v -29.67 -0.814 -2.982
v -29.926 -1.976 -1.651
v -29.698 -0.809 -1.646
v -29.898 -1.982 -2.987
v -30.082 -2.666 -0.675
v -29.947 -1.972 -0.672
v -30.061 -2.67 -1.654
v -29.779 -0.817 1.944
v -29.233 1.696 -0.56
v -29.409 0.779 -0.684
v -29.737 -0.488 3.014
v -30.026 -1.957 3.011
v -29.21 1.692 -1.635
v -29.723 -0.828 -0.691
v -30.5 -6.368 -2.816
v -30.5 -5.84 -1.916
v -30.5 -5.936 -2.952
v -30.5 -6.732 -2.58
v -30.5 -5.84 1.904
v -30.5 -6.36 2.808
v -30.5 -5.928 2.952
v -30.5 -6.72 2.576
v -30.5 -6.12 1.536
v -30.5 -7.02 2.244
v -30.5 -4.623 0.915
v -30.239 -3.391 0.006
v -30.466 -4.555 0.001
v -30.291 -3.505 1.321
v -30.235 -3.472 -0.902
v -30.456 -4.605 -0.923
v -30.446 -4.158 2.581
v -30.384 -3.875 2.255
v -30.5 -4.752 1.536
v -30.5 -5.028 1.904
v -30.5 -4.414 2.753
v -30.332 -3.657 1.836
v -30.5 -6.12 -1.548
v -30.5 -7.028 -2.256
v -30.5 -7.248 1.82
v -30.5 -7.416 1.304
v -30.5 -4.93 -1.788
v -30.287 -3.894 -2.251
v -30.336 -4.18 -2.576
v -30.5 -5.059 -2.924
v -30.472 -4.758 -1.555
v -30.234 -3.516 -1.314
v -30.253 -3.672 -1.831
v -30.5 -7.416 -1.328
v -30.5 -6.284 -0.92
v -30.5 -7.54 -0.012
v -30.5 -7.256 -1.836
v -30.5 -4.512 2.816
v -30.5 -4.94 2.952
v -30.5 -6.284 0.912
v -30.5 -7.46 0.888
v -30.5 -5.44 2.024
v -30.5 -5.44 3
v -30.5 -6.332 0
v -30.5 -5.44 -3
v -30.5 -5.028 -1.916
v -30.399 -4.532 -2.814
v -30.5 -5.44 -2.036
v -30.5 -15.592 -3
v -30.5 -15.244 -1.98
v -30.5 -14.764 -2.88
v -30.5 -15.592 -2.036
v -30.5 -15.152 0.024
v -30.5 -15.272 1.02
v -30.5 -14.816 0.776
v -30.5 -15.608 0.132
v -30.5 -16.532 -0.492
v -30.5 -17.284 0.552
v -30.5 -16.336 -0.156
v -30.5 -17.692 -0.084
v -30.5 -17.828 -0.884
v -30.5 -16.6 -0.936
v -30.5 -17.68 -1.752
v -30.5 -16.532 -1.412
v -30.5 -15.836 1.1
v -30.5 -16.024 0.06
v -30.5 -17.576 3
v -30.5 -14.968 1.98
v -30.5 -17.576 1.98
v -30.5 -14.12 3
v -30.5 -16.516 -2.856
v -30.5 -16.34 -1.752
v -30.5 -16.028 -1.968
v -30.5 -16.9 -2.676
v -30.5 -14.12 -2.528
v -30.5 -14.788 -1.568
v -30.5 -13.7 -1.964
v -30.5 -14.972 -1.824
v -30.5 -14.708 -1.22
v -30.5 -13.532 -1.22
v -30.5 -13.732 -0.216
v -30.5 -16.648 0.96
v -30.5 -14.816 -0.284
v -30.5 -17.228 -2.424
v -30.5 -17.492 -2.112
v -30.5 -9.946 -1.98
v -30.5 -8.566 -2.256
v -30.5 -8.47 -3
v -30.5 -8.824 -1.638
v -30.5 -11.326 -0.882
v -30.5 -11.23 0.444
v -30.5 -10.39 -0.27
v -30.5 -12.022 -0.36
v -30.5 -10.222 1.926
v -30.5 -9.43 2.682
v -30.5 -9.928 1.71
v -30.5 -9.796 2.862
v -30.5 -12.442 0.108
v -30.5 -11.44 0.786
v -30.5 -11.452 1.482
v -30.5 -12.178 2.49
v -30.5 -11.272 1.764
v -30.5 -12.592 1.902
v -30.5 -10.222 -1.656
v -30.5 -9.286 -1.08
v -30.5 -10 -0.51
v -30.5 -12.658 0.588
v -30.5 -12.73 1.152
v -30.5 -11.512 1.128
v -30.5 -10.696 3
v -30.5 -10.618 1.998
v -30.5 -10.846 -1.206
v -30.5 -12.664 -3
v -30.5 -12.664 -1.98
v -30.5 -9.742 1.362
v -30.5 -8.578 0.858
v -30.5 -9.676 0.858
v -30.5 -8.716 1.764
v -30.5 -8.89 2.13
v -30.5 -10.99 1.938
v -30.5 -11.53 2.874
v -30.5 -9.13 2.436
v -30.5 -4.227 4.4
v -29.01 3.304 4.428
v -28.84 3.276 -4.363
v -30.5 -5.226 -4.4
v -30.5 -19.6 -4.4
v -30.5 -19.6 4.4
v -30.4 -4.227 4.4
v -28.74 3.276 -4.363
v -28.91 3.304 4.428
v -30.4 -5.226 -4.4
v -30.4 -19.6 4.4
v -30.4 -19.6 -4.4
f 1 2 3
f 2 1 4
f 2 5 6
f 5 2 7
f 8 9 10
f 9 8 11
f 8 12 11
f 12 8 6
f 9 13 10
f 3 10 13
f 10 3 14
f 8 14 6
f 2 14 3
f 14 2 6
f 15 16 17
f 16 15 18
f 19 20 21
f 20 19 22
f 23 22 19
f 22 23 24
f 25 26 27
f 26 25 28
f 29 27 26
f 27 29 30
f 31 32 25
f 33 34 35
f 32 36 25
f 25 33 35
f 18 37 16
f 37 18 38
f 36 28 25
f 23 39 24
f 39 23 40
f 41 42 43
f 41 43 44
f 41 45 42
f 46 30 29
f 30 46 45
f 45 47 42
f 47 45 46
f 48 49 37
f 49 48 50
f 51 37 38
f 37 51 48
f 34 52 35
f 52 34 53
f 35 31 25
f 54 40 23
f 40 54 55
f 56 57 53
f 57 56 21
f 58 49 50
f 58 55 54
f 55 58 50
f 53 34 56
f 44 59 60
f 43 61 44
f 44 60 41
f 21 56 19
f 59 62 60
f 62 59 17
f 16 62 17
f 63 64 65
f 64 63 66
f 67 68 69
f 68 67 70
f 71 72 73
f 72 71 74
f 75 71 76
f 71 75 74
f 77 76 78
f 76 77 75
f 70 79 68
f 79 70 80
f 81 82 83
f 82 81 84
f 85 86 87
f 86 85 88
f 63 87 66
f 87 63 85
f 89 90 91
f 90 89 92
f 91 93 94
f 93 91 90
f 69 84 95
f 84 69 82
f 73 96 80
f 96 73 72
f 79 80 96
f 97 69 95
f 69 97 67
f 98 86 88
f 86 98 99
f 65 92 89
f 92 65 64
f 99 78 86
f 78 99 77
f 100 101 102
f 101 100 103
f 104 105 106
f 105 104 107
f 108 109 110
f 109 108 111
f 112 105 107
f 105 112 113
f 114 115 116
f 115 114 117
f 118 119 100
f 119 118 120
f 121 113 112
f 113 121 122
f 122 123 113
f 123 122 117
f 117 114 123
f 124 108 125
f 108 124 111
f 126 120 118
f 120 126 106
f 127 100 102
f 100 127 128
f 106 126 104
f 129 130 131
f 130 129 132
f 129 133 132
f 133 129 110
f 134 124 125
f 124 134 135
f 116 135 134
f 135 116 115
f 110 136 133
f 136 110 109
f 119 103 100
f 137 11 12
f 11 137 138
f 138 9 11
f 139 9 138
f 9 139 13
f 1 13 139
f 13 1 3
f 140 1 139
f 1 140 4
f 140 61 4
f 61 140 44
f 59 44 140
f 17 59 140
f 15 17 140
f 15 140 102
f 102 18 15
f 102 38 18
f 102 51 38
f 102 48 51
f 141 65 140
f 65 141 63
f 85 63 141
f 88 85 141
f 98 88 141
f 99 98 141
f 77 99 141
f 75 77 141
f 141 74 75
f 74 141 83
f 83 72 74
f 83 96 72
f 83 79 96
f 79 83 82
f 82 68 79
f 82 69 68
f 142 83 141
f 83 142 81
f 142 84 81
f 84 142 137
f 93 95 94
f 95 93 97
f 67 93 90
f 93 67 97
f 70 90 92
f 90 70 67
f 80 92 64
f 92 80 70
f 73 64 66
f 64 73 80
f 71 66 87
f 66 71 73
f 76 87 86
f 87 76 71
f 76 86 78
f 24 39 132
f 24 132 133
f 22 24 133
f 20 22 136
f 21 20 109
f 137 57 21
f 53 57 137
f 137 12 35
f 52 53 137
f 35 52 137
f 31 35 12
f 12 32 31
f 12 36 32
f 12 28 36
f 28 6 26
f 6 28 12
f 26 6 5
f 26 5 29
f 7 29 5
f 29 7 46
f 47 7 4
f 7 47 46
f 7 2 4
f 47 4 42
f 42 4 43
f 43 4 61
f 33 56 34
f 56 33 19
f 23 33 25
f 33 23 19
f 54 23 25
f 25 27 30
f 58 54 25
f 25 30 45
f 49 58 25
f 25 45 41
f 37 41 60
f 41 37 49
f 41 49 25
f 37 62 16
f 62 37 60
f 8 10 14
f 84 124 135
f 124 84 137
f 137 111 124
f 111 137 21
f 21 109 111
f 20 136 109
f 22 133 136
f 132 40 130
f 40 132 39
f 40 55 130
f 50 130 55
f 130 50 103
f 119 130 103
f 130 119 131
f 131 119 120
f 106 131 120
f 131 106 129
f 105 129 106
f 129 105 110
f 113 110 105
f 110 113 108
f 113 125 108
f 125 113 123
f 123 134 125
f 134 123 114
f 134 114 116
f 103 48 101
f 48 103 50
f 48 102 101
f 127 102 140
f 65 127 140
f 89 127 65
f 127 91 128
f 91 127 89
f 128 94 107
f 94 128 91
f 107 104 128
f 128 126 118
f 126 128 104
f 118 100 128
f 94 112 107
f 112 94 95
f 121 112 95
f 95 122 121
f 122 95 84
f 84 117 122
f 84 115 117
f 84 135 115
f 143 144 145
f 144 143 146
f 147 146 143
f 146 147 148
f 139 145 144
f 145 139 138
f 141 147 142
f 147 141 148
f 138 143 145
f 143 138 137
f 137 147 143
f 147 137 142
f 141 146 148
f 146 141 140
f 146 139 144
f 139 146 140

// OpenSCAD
use <../lib.scad>
function ldraw_lib__194305fc02() = [
// 0 Sticker  1.1 x  2.9 with White "4025" on Transparent Background (Formed for Boat Stern Right Side)
// 0 Name: 194305fc02.dat
// 0 Author: Takeshi Takahashi [RainbowDolphin]
// 0 !LDRAW_ORG Part UPDATE 2022-06
// 0 !LICENSE Licensed under CC BY 2.0 and CC BY 4.0 : see CAreadme.txt
// 
// 0 BFC CERTIFY CCW
  [0,"BFC","CERTIFY"],
  [0,"BFC","CCW"],
// 
// 0 !KEYWORDS Bricklink 4025stk01, Brickowl 866936, Fire boat, Rebrickable 194305
// 0 !KEYWORDS Set 4025
// 
// 0 !HISTORY 2022-12-20 [PTadmin] Official Update 2022-06
// 
// 
// 0 BFC NOCLIP
  [0,"BFC","NOCLIP"],
// 4 15 -74.1739 7.454 -2.0356 -74.7438 7.4666 -4.9542 -74.8151 4.1282 -4.9403 -74.2453 4.1155 -2.0216
  [4,15,-74.1739,7.454,-2.0356,-74.7438,7.4666,-4.9542,-74.8151,4.1282,-4.9403,-74.2453,4.1155,-2.0216],
// 4 15 -74.8675 1.6793 -4.9301 -74.8151 4.1282 -4.9403 -75.1537 4.1357 -6.6742 -75.206 1.6868 -6.6639
  [4,15,-74.8675,1.6793,-4.9301,-74.8151,4.1282,-4.9403,-75.1537,4.1357,-6.6742,-75.206,1.6868,-6.6639],
// 4 15 -73.5233 1.7095 1.9474 -74.4483 -4.86 -2.042 -74.3434 -7.5361 -1.2192 -73.0821 1.3997 4.2412
  [4,15,-73.5233,1.7095,1.9474,-74.4483,-4.86,-2.042,-74.3434,-7.5361,-1.2192,-73.0821,1.3997,4.2412],
// 4 15 -75.0641 -7.5263 -4.8917 -74.3434 -7.5361 -1.2192 -74.4483 -4.86 -2.042 -74.8675 1.6793 -4.9301
  [4,15,-75.0641,-7.5263,-4.8917,-74.3434,-7.5361,-1.2192,-74.4483,-4.86,-2.042,-74.8675,1.6793,-4.9301],
// 3 15 -73.0821 1.3997 4.2412 -73.0246 4.0885 4.2299 -73.5233 1.7095 1.9474
  [3,15,-73.0821,1.3997,4.2412,-73.0246,4.0885,4.2299,-73.5233,1.7095,1.9474],
// 4 15 -74.3076 1.7269 -2.0694 -73.5233 1.7095 1.9474 -73.0246 4.0885 4.2299 -74.2453 4.1155 -2.0216
  [4,15,-74.3076,1.7269,-2.0694,-73.5233,1.7095,1.9474,-73.0246,4.0885,4.2299,-74.2453,4.1155,-2.0216],
// 3 15 -74.4483 -4.86 -2.042 -74.3076 1.7269 -2.0694 -74.8675 1.6793 -4.9301
  [3,15,-74.4483,-4.86,-2.042,-74.3076,1.7269,-2.0694,-74.8675,1.6793,-4.9301],
// 4 15 -74.2453 4.1155 -2.0216 -74.8151 4.1282 -4.9403 -74.8675 1.6793 -4.9301 -74.3076 1.7269 -2.0694
  [4,15,-74.2453,4.1155,-2.0216,-74.8151,4.1282,-4.9403,-74.8675,1.6793,-4.9301,-74.3076,1.7269,-2.0694],
// 4 15 -76.25 6.45 -16.83 -76.25 4.79 -14.6 -76.25 7.38 -14.84 -76.25 7.04 -15.92
  [4,15,-76.25,6.45,-16.83,-76.25,4.79,-14.6,-76.25,7.38,-14.84,-76.25,7.04,-15.92],
// 4 15 -76.25 -7.38 -14.82 -76.25 -4.76 -14.6 -76.25 -6.44 -16.8 -76.25 -7.02 -15.9
  [4,15,-76.25,-7.38,-14.82,-76.25,-4.76,-14.6,-76.25,-6.44,-16.8,-76.25,-7.02,-15.9],
// 4 15 -76.25 -5.61 -17.55 -76.25 -6.44 -16.8 -76.25 -4.76 -14.6 -76.25 -3.84 -15.3
  [4,15,-76.25,-5.61,-17.55,-76.25,-6.44,-16.8,-76.25,-4.76,-14.6,-76.25,-3.84,-15.3],
// 4 15 -75.7265 -3.3016 -8.7623 -75.598 -.0145 -8.4774 -76.166 -.0019 -11.3864 -76.25 -2.2876 -11.557
  [4,15,-75.7265,-3.3016,-8.7623,-75.598,-.0145,-8.4774,-76.166,-.0019,-11.3864,-76.25,-2.2876,-11.557],
// 4 15 -75.598 -.0145 -8.4774 -75.5871 2.2553 -8.6795 -76.1392 2.3075 -11.5116 -76.166 -.0019 -11.3864
  [4,15,-75.598,-.0145,-8.4774,-75.5871,2.2553,-8.6795,-76.1392,2.3075,-11.5116,-76.166,-.0019,-11.3864],
// 3 15 -76.1156 -6.453 -10.3962 -75.959 -5.6365 -9.6869 -76.25 -2.2876 -11.557
  [3,15,-76.1156,-6.453,-10.3962,-75.959,-5.6365,-9.6869,-76.25,-2.2876,-11.557],
// 3 15 -76.25 -3.84 -11.881 -76.25 -4.76 -12.57 -76.25 -6.8814 -11.0354
  [3,15,-76.25,-3.84,-11.881,-76.25,-4.76,-12.57,-76.25,-6.8814,-11.0354],
// 3 15 -75.959 -5.6365 -9.6869 -75.8293 -4.5893 -9.1422 -76.25 -2.2876 -11.557
  [3,15,-75.959,-5.6365,-9.6869,-75.8293,-4.5893,-9.1422,-76.25,-2.2876,-11.557],
// 3 15 -76.25 -2.2876 -11.557 -76.25 -3.84 -11.881 -76.25 -6.8814 -11.0354
  [3,15,-76.25,-2.2876,-11.557,-76.25,-3.84,-11.881,-76.25,-6.8814,-11.0354],
// 4 15 -76.25 4.79 -14.6 -76.25 6.45 -16.83 -76.25 5.64 -17.57 -76.25 3.87 -15.3
  [4,15,-76.25,4.79,-14.6,-76.25,6.45,-16.83,-76.25,5.64,-17.57,-76.25,3.87,-15.3],
// 3 15 -75.8293 -4.5893 -9.1422 -75.7265 -3.3016 -8.7623 -76.25 -2.2876 -11.557
  [3,15,-75.8293,-4.5893,-9.1422,-75.7265,-3.3016,-8.7623,-76.25,-2.2876,-11.557],
// 4 15 -76.25 -3.26 -18.54 -76.25 -4.55 -18.12 -76.25 -5.61 -17.55 -76.25 -3.84 -15.3
  [4,15,-76.25,-3.26,-18.54,-76.25,-4.55,-18.12,-76.25,-5.61,-17.55,-76.25,-3.84,-15.3],
// 3 15 -76.25 4.469 -12.3242 -75.7183 5.6282 -9.7339 -75.8401 6.4409 -10.4501
  [3,15,-76.25,4.469,-12.3242,-75.7183,5.6282,-9.7339,-75.8401,6.4409,-10.4501],
// 3 15 -76.25 4.469 -12.3242 -75.8401 6.4409 -10.4501 -76.25 7.311 -12.647
  [3,15,-76.25,4.469,-12.3242,-75.8401,6.4409,-10.4501,-76.25,7.311,-12.647],
// 3 15 -76.25 4.469 -12.3242 -76.179 3.8884 -11.8949 -75.7183 5.6282 -9.7339
  [3,15,-76.25,4.469,-12.3242,-76.179,3.8884,-11.8949,-75.7183,5.6282,-9.7339],
// 4 15 -75.5871 2.2553 -8.6795 -75.5858 3.2853 -8.7897 -76.179 3.8884 -11.8949 -76.1392 2.3075 -11.5116
  [4,15,-75.5871,2.2553,-8.6795,-75.5858,3.2853,-8.7897,-76.179,3.8884,-11.8949,-76.1392,2.3075,-11.5116],
// 4 15 -75.5858 3.2853 -8.7897 -75.6335 4.5763 -9.1804 -75.7183 5.6282 -9.7339 -76.179 3.8884 -11.8949
  [4,15,-75.5858,3.2853,-8.7897,-75.6335,4.5763,-9.1804,-75.7183,5.6282,-9.7339,-76.179,3.8884,-11.8949],
// 4 15 -76.25 .03 -18.85 -76.25 2.3 -15.71 -76.25 3.87 -15.3 -76.25 3.32 -18.54
  [4,15,-76.25,.03,-18.85,-76.25,2.3,-15.71,-76.25,3.87,-15.3,-76.25,3.32,-18.54],
// 4 15 -76.25 5.64 -17.57 -76.25 4.59 -18.14 -76.25 3.32 -18.54 -76.25 3.87 -15.3
  [4,15,-76.25,5.64,-17.57,-76.25,4.59,-18.14,-76.25,3.32,-18.54,-76.25,3.87,-15.3],
// 4 15 -76.25 -7.04 -11.28 -76.25 -6.8814 -11.0354 -76.25 -4.76 -12.57 -76.25 -7.38 -12.35
  [4,15,-76.25,-7.04,-11.28,-76.25,-6.8814,-11.0354,-76.25,-4.76,-12.57,-76.25,-7.38,-12.35],
// 3 15 -76.25 -6.8814 -11.0354 -76.1156 -6.453 -10.3962 -76.25 -2.2876 -11.557
  [3,15,-76.25,-6.8814,-11.0354,-76.1156,-6.453,-10.3962,-76.25,-2.2876,-11.557],
// 4 15 -76.25 -3.84 -15.3 -76.25 -2.28 -15.71 -76.25 -2.22 -18.65 -76.25 -3.26 -18.54
  [4,15,-76.25,-3.84,-15.3,-76.25,-2.28,-15.71,-76.25,-2.22,-18.65,-76.25,-3.26,-18.54],
// 4 15 -76.25 -7.38 -14.82 -76.25 -7.5 -13.6 -76.25 -7.38 -12.35 -76.25 -5.06 -13.6
  [4,15,-76.25,-7.38,-14.82,-76.25,-7.5,-13.6,-76.25,-7.38,-12.35,-76.25,-5.06,-13.6],
// 3 15 -76.25 0 -15.83 -76.25 2.3 -15.71 -76.25 .03 -18.85
  [3,15,-76.25,0,-15.83,-76.25,2.3,-15.71,-76.25,.03,-18.85],
// 4 15 -76.25 -2.28 -15.71 -76.25 0 -15.83 -76.25 .03 -18.85 -76.25 -2.22 -18.65
  [4,15,-76.25,-2.28,-15.71,-76.25,0,-15.83,-76.25,.03,-18.85,-76.25,-2.22,-18.65],
// 3 15 -76.25 -7.38 -12.35 -76.25 -4.76 -12.57 -76.25 -5.06 -13.6
  [3,15,-76.25,-7.38,-12.35,-76.25,-4.76,-12.57,-76.25,-5.06,-13.6],
// 3 15 -76.25 7.311 -12.647 -76.25 7.5 -13.6 -76.25 4.79 -12.57
  [3,15,-76.25,7.311,-12.647,-76.25,7.5,-13.6,-76.25,4.79,-12.57],
// 3 15 -75.8401 6.4409 -10.4501 -75.9987 7.0344 -11.3291 -76.25 7.311 -12.647
  [3,15,-75.8401,6.4409,-10.4501,-75.9987,7.0344,-11.3291,-76.25,7.311,-12.647],
// 3 15 -76.25 7.311 -12.647 -76.25 4.79 -12.57 -76.25 4.469 -12.3242
  [3,15,-76.25,7.311,-12.647,-76.25,4.79,-12.57,-76.25,4.469,-12.3242],
// 3 15 -76.25 -7.38 -14.82 -76.25 -5.06 -13.6 -76.25 -4.76 -14.6
  [3,15,-76.25,-7.38,-14.82,-76.25,-5.06,-13.6,-76.25,-4.76,-14.6],
// 4 15 -76.25 4.79 -12.57 -76.25 7.5 -13.6 -76.25 7.38 -14.84 -76.25 5.09 -13.6
  [4,15,-76.25,4.79,-12.57,-76.25,7.5,-13.6,-76.25,7.38,-14.84,-76.25,5.09,-13.6],
// 3 15 -76.25 4.79 -14.6 -76.25 5.09 -13.6 -76.25 7.38 -14.84
  [3,15,-76.25,4.79,-14.6,-76.25,5.09,-13.6,-76.25,7.38,-14.84],
// 4 15 -76.25 7.2 -36.91 -76.25 7.5 -38.98 -76.25 5.09 -38.98 -76.25 4.95 -38.11
  [4,15,-76.25,7.2,-36.91,-76.25,7.5,-38.98,-76.25,5.09,-38.98,-76.25,4.95,-38.11],
// 4 15 -76.25 -1.94 -37.04 -76.25 -.06 -37.88 -76.25 -.33 -39.02 -76.25 -2.55 -38.18
  [4,15,-76.25,-1.94,-37.04,-76.25,-.06,-37.88,-76.25,-.33,-39.02,-76.25,-2.55,-38.18],
// 4 15 -76.25 .39 -40.84 -76.25 1.23 -41.33 -76.25 .21 -44.23 -76.25 -1.38 -43.21
  [4,15,-76.25,.39,-40.84,-76.25,1.23,-41.33,-76.25,.21,-44.23,-76.25,-1.38,-43.21],
// 4 15 -76.25 .21 -44.23 -76.25 1.23 -41.33 -76.25 2.34 -41.5 -76.25 2.21 -44.57
  [4,15,-76.25,.21,-44.23,-76.25,1.23,-41.33,-76.25,2.34,-41.5,-76.25,2.21,-44.57],
// 4 15 -76.25 3.53 -41.33 -76.25 4.38 -44.2 -76.25 2.21 -44.57 -76.25 2.34 -41.5
  [4,15,-76.25,3.53,-41.33,-76.25,4.38,-44.2,-76.25,2.21,-44.57,-76.25,2.34,-41.5],
// 4 15 -76.25 -2.55 -38.18 -76.25 -.33 -39.02 -76.25 -.15 -40.06 -76.25 -2.75 -39.59
  [4,15,-76.25,-2.55,-38.18,-76.25,-.33,-39.02,-76.25,-.15,-40.06,-76.25,-2.75,-39.59],
// 4 15 -76.25 -7.5 -35.3 -76.25 -4.95 -37.42 -76.25 -4.95 -43.94 -76.25 -7.5 -43.94
  [4,15,-76.25,-7.5,-35.3,-76.25,-4.95,-37.42,-76.25,-4.95,-43.94,-76.25,-7.5,-43.94],
// 4 15 -76.25 6.69 -42.25 -76.25 4.38 -40.85 -76.25 4.92 -40.07 -76.25 7.14 -41.29
  [4,15,-76.25,6.69,-42.25,-76.25,4.38,-40.85,-76.25,4.92,-40.07,-76.25,7.14,-41.29],
// 4 15 -76.25 5.09 -38.98 -76.25 7.5 -38.98 -76.25 7.14 -41.29 -76.25 4.92 -40.07
  [4,15,-76.25,5.09,-38.98,-76.25,7.5,-38.98,-76.25,7.14,-41.29,-76.25,4.92,-40.07],
// 4 15 -76.25 4.56 -37.43 -76.25 3.92 -36.97 -76.25 4.91 -34.25 -76.25 6.32 -35.3
  [4,15,-76.25,4.56,-37.43,-76.25,3.92,-36.97,-76.25,4.91,-34.25,-76.25,6.32,-35.3],
// 4 15 -76.25 3.05 -33.83 -76.25 4.91 -34.25 -76.25 3.92 -36.97 -76.25 3.05 -36.77
  [4,15,-76.25,3.05,-33.83,-76.25,4.91,-34.25,-76.25,3.92,-36.97,-76.25,3.05,-36.77],
// 4 15 -76.25 -4.95 -37.42 -76.25 -7.5 -35.3 -76.25 .54 -34.33 -76.25 -1.94 -37.04
  [4,15,-76.25,-4.95,-37.42,-76.25,-7.5,-35.3,-76.25,.54,-34.33,-76.25,-1.94,-37.04],
// 4 15 -76.25 -1.38 -43.21 -76.25 -2.4 -41.62 -76.25 -.15 -40.06 -76.25 .39 -40.84
  [4,15,-76.25,-1.38,-43.21,-76.25,-2.4,-41.62,-76.25,-.15,-40.06,-76.25,.39,-40.84],
// 3 15 -76.25 -2.75 -39.59 -76.25 -.15 -40.06 -76.25 -2.4 -41.62
  [3,15,-76.25,-2.75,-39.59,-76.25,-.15,-40.06,-76.25,-2.4,-41.62],
// 4 15 -76.25 .54 -34.33 -76.25 .71 -37.04 -76.25 -.06 -37.88 -76.25 -1.94 -37.04
  [4,15,-76.25,.54,-34.33,-76.25,.71,-37.04,-76.25,-.06,-37.88,-76.25,-1.94,-37.04],
// 4 15 -76.25 5.28 -43.73 -76.25 4.38 -40.85 -76.25 6.69 -42.25 -76.25 6.06 -43.07
  [4,15,-76.25,5.28,-43.73,-76.25,4.38,-40.85,-76.25,6.69,-42.25,-76.25,6.06,-43.07],
// 4 15 -76.25 6.32 -35.3 -76.25 7.2 -36.91 -76.25 4.95 -38.11 -76.25 4.56 -37.43
  [4,15,-76.25,6.32,-35.3,-76.25,7.2,-36.91,-76.25,4.95,-38.11,-76.25,4.56,-37.43],
// 4 15 -76.25 4.38 -44.2 -76.25 3.53 -41.33 -76.25 4.38 -40.85 -76.25 5.28 -43.73
  [4,15,-76.25,4.38,-44.2,-76.25,3.53,-41.33,-76.25,4.38,-40.85,-76.25,5.28,-43.73],
// 4 15 -76.25 4.095 -22.06 -76.25 5.64 -21.415 -76.25 7.5 -21.175 -76.25 4.95 -24.865
  [4,15,-76.25,4.095,-22.06,-76.25,5.64,-21.415,-76.25,7.5,-21.175,-76.25,4.95,-24.865],
// 4 15 -76.25 .675 -25.975 -76.25 2.205 -28.315 -76.25 .9 -30.055 -76.25 -1.11 -28.075
  [4,15,-76.25,.675,-25.975,-76.25,2.205,-28.315,-76.25,.9,-30.055,-76.25,-1.11,-28.075],
// 4 15 -76.25 -7.155 -24.49 -76.25 -6.705 -23.575 -76.25 -4.275 -24.82 -76.25 -4.815 -25.555
  [4,15,-76.25,-7.155,-24.49,-76.25,-6.705,-23.575,-76.25,-4.275,-24.82,-76.25,-4.815,-25.555],
// 4 15 -76.25 .9 -30.055 -76.25 -.27 -31.105 -76.25 -1.965 -28.6 -76.25 -1.11 -28.075
  [4,15,-76.25,.9,-30.055,-76.25,-.27,-31.105,-76.25,-1.965,-28.6,-76.25,-1.11,-28.075],
// 4 15 -76.25 -4.41 -28.18 -76.25 -3.705 -28.63 -76.25 -4.755 -31.48 -76.25 -6.225 -30.445
  [4,15,-76.25,-4.41,-28.18,-76.25,-3.705,-28.63,-76.25,-4.755,-31.48,-76.25,-6.225,-30.445],
// 4 15 -76.25 1.275 -25 -76.25 2.7 -23.215 -76.25 4.95 -24.865 -76.25 4.14 -25.555
  [4,15,-76.25,1.275,-25,-76.25,2.7,-23.215,-76.25,4.95,-24.865,-76.25,4.14,-25.555],
// 4 15 -76.25 -1.965 -28.6 -76.25 -.27 -31.105 -76.25 -1.47 -31.645 -76.25 -2.88 -31.825
  [4,15,-76.25,-1.965,-28.6,-76.25,-.27,-31.105,-76.25,-1.47,-31.645,-76.25,-2.88,-31.825],
// 4 15 -76.25 -2.82 -28.78 -76.25 -1.965 -28.6 -76.25 -2.88 -31.825 -76.25 -4.755 -31.48
  [4,15,-76.25,-2.82,-28.78,-76.25,-1.965,-28.6,-76.25,-2.88,-31.825,-76.25,-4.755,-31.48],
// 3 15 -76.25 -4.755 -31.48 -76.25 -3.705 -28.63 -76.25 -2.82 -28.78
  [3,15,-76.25,-4.755,-31.48,-76.25,-3.705,-28.63,-76.25,-2.82,-28.78],
// 4 15 -76.25 -4.995 -26.545 -76.25 -7.5 -26.74 -76.25 -7.155 -24.49 -76.25 -4.815 -25.555
  [4,15,-76.25,-4.995,-26.545,-76.25,-7.5,-26.74,-76.25,-7.155,-24.49,-76.25,-4.815,-25.555],
// 4 15 -76.25 .675 -25.975 -76.25 1.275 -25 -76.25 4.14 -25.555 -76.25 3.015 -27.115
  [4,15,-76.25,.675,-25.975,-76.25,1.275,-25,-76.25,4.14,-25.555,-76.25,3.015,-27.115],
// 4 15 -76.25 4.95 -24.865 -76.25 7.5 -21.175 -76.25 7.5 -31.66 -76.25 4.95 -31.66
  [4,15,-76.25,4.95,-24.865,-76.25,7.5,-21.175,-76.25,7.5,-31.66,-76.25,4.95,-31.66],
// 3 15 -76.25 .675 -25.975 -76.25 3.015 -27.115 -76.25 2.205 -28.315
  [3,15,-76.25,.675,-25.975,-76.25,3.015,-27.115,-76.25,2.205,-28.315],
// 4 15 -76.25 -4.41 -21.79 -76.25 -2.145 -21.445 -76.25 -2.145 -24.19 -76.25 -3.405 -24.355
  [4,15,-76.25,-4.41,-21.79,-76.25,-2.145,-21.445,-76.25,-2.145,-24.19,-76.25,-3.405,-24.355],
// 4 15 -76.25 -4.275 -24.82 -76.25 -5.325 -22.225 -76.25 -4.41 -21.79 -76.25 -3.405 -24.355
  [4,15,-76.25,-4.275,-24.82,-76.25,-5.325,-22.225,-76.25,-4.41,-21.79,-76.25,-3.405,-24.355],
// 4 15 -76.25 -4.995 -26.545 -76.25 -4.845 -27.475 -76.25 -7.185 -28.825 -76.25 -7.5 -26.74
  [4,15,-76.25,-4.995,-26.545,-76.25,-4.845,-27.475,-76.25,-7.185,-28.825,-76.25,-7.5,-26.74],
// 4 15 -76.25 -6.225 -30.445 -76.25 -7.185 -28.825 -76.25 -4.845 -27.475 -76.25 -4.41 -28.18
  [4,15,-76.25,-6.225,-30.445,-76.25,-7.185,-28.825,-76.25,-4.845,-27.475,-76.25,-4.41,-28.18],
// 4 15 -76.25 -5.325 -22.225 -76.25 -4.275 -24.82 -76.25 -6.705 -23.575 -76.25 -6.09 -22.825
  [4,15,-76.25,-5.325,-22.225,-76.25,-4.275,-24.82,-76.25,-6.705,-23.575,-76.25,-6.09,-22.825],
// 3 15 -76.25 2.7 -23.215 -76.25 4.095 -22.06 -76.25 4.95 -24.865
  [3,15,-76.25,2.7,-23.215,-76.25,4.095,-22.06,-76.25,4.95,-24.865],
// 0 BFC CLIP
  [0,"BFC","CLIP"],
// 4 16 -75.0641 -7.5263 -4.8917 -76.25 -11 -10.5677 -72.5254 -11.0706 8.2593 -74.3434 -7.5361 -1.2192
  [4,16,-75.0641,-7.5263,-4.8917,-76.25,-11,-10.5677,-72.5254,-11.0706,8.2593,-74.3434,-7.5361,-1.2192],
// 3 16 -72.5254 -11.0706 8.2593 -73.0821 1.3997 4.2412 -74.3434 -7.5361 -1.2192
  [3,16,-72.5254,-11.0706,8.2593,-73.0821,1.3997,4.2412,-74.3434,-7.5361,-1.2192],
// 4 16 -73.0821 1.3997 4.2412 -72.5254 -11.0706 8.2593 -72.0999 10.9079 8.1893 -73.0246 4.0885 4.2299
  [4,16,-73.0821,1.3997,4.2412,-72.5254,-11.0706,8.2593,-72.0999,10.9079,8.1893,-73.0246,4.0885,4.2299],
// 4 16 -74.2453 4.1155 -2.0216 -73.0246 4.0885 4.2299 -72.0999 10.9079 8.1893 -74.1739 7.454 -2.0356
  [4,16,-74.2453,4.1155,-2.0216,-73.0246,4.0885,4.2299,-72.0999,10.9079,8.1893,-74.1739,7.454,-2.0356],
// 4 16 -74.7438 7.4666 -4.9542 -74.1739 7.454 -2.0356 -72.0999 10.9079 8.1893 -76.25 11 -13.0658
  [4,16,-74.7438,7.4666,-4.9542,-74.1739,7.454,-2.0356,-72.0999,10.9079,8.1893,-76.25,11,-13.0658],
// 4 16 -76.25 11 -13.0658 -76.25 7.311 -12.647 -75.9987 7.0344 -11.3291 -74.7438 7.4666 -4.9542
  [4,16,-76.25,11,-13.0658,-76.25,7.311,-12.647,-75.9987,7.0344,-11.3291,-74.7438,7.4666,-4.9542],
// 3 16 -76.25 7.5 -13.6 -76.25 7.311 -12.647 -76.25 11 -13.0658
  [3,16,-76.25,7.5,-13.6,-76.25,7.311,-12.647,-76.25,11,-13.0658],
// 3 16 -76.25 7.38 -14.84 -76.25 7.5 -13.6 -76.25 11 -13.0658
  [3,16,-76.25,7.38,-14.84,-76.25,7.5,-13.6,-76.25,11,-13.0658],
// 3 16 -76.25 7.04 -15.92 -76.25 7.38 -14.84 -76.25 11 -13.0658
  [3,16,-76.25,7.04,-15.92,-76.25,7.38,-14.84,-76.25,11,-13.0658],
// 3 16 -76.25 7.04 -15.92 -76.25 11 -13.0658 -76.25 7.5 -21.175
  [3,16,-76.25,7.04,-15.92,-76.25,11,-13.0658,-76.25,7.5,-21.175],
// 3 16 -76.25 7.5 -21.175 -76.25 6.45 -16.83 -76.25 7.04 -15.92
  [3,16,-76.25,7.5,-21.175,-76.25,6.45,-16.83,-76.25,7.04,-15.92],
// 3 16 -76.25 7.5 -21.175 -76.25 5.64 -17.57 -76.25 6.45 -16.83
  [3,16,-76.25,7.5,-21.175,-76.25,5.64,-17.57,-76.25,6.45,-16.83],
// 3 16 -76.25 7.5 -21.175 -76.25 4.59 -18.14 -76.25 5.64 -17.57
  [3,16,-76.25,7.5,-21.175,-76.25,4.59,-18.14,-76.25,5.64,-17.57],
// 3 16 -76.25 7.5 -21.175 -76.25 3.32 -18.54 -76.25 4.59 -18.14
  [3,16,-76.25,7.5,-21.175,-76.25,3.32,-18.54,-76.25,4.59,-18.14],
// 4 16 -76.25 7.5 -38.98 -76.25 7.2 -36.91 -76.25 11 -13.0658 -76.25 11 -49
  [4,16,-76.25,7.5,-38.98,-76.25,7.2,-36.91,-76.25,11,-13.0658,-76.25,11,-49],
// 3 16 -76.25 7.14 -41.29 -76.25 7.5 -38.98 -76.25 11 -49
  [3,16,-76.25,7.14,-41.29,-76.25,7.5,-38.98,-76.25,11,-49],
// 3 16 -76.25 6.69 -42.25 -76.25 7.14 -41.29 -76.25 11 -49
  [3,16,-76.25,6.69,-42.25,-76.25,7.14,-41.29,-76.25,11,-49],
// 3 16 -76.25 6.06 -43.07 -76.25 6.69 -42.25 -76.25 11 -49
  [3,16,-76.25,6.06,-43.07,-76.25,6.69,-42.25,-76.25,11,-49],
// 3 16 -76.25 5.28 -43.73 -76.25 6.06 -43.07 -76.25 11 -49
  [3,16,-76.25,5.28,-43.73,-76.25,6.06,-43.07,-76.25,11,-49],
// 3 16 -76.25 4.38 -44.2 -76.25 5.28 -43.73 -76.25 11 -49
  [3,16,-76.25,4.38,-44.2,-76.25,5.28,-43.73,-76.25,11,-49],
// 3 16 -76.25 2.21 -44.57 -76.25 4.38 -44.2 -76.25 11 -49
  [3,16,-76.25,2.21,-44.57,-76.25,4.38,-44.2,-76.25,11,-49],
// 4 16 -76.25 .21 -44.23 -76.25 2.21 -44.57 -76.25 11 -49 -76.25 -4.95 -43.94
  [4,16,-76.25,.21,-44.23,-76.25,2.21,-44.57,-76.25,11,-49,-76.25,-4.95,-43.94],
// 3 16 -76.25 -4.95 -43.94 -76.25 -1.38 -43.21 -76.25 .21 -44.23
  [3,16,-76.25,-4.95,-43.94,-76.25,-1.38,-43.21,-76.25,.21,-44.23],
// 3 16 -76.25 -4.95 -43.94 -76.25 -2.4 -41.62 -76.25 -1.38 -43.21
  [3,16,-76.25,-4.95,-43.94,-76.25,-2.4,-41.62,-76.25,-1.38,-43.21],
// 4 16 -76.25 -2.75 -39.59 -76.25 -2.4 -41.62 -76.25 -4.95 -43.94 -76.25 -4.95 -37.42
  [4,16,-76.25,-2.75,-39.59,-76.25,-2.4,-41.62,-76.25,-4.95,-43.94,-76.25,-4.95,-37.42],
// 3 16 -76.25 -4.95 -37.42 -76.25 -2.55 -38.18 -76.25 -2.75 -39.59
  [3,16,-76.25,-4.95,-37.42,-76.25,-2.55,-38.18,-76.25,-2.75,-39.59],
// 3 16 -76.25 -4.95 -37.42 -76.25 -1.94 -37.04 -76.25 -2.55 -38.18
  [3,16,-76.25,-4.95,-37.42,-76.25,-1.94,-37.04,-76.25,-2.55,-38.18],
// 4 16 -76.25 -4.95 -43.94 -76.25 11 -49 -76.25 -11 -49 -76.25 -7.5 -43.94
  [4,16,-76.25,-4.95,-43.94,-76.25,11,-49,-76.25,-11,-49,-76.25,-7.5,-43.94],
// 4 16 -76.25 -7.5 -35.3 -76.25 -7.5 -43.94 -76.25 -11 -49 -76.25 -11 -10.5677
  [4,16,-76.25,-7.5,-35.3,-76.25,-7.5,-43.94,-76.25,-11,-49,-76.25,-11,-10.5677],
// 4 16 -76.25 .71 -37.04 -76.25 .54 -34.33 -76.25 3.05 -33.83 -76.25 3.05 -36.77
  [4,16,-76.25,.71,-37.04,-76.25,.54,-34.33,-76.25,3.05,-33.83,-76.25,3.05,-36.77],
// 4 16 -76.25 -.06 -37.88 -76.25 .71 -37.04 -76.25 3.05 -36.77 -76.25 3.92 -36.97
  [4,16,-76.25,-.06,-37.88,-76.25,.71,-37.04,-76.25,3.05,-36.77,-76.25,3.92,-36.97],
// 4 16 -76.25 -.33 -39.02 -76.25 -.06 -37.88 -76.25 3.92 -36.97 -76.25 4.56 -37.43
  [4,16,-76.25,-.33,-39.02,-76.25,-.06,-37.88,-76.25,3.92,-36.97,-76.25,4.56,-37.43],
// 4 16 -76.25 -.15 -40.06 -76.25 -.33 -39.02 -76.25 4.56 -37.43 -76.25 4.95 -38.11
  [4,16,-76.25,-.15,-40.06,-76.25,-.33,-39.02,-76.25,4.56,-37.43,-76.25,4.95,-38.11],
// 4 16 -76.25 .39 -40.84 -76.25 -.15 -40.06 -76.25 4.95 -38.11 -76.25 5.09 -38.98
  [4,16,-76.25,.39,-40.84,-76.25,-.15,-40.06,-76.25,4.95,-38.11,-76.25,5.09,-38.98],
// 4 16 -76.25 1.23 -41.33 -76.25 .39 -40.84 -76.25 5.09 -38.98 -76.25 4.92 -40.07
  [4,16,-76.25,1.23,-41.33,-76.25,.39,-40.84,-76.25,5.09,-38.98,-76.25,4.92,-40.07],
// 4 16 -76.25 2.34 -41.5 -76.25 1.23 -41.33 -76.25 4.92 -40.07 -76.25 4.38 -40.85
  [4,16,-76.25,2.34,-41.5,-76.25,1.23,-41.33,-76.25,4.92,-40.07,-76.25,4.38,-40.85],
// 3 16 -76.25 2.34 -41.5 -76.25 4.38 -40.85 -76.25 3.53 -41.33
  [3,16,-76.25,2.34,-41.5,-76.25,4.38,-40.85,-76.25,3.53,-41.33],
// 3 16 -76.25 -5.61 -17.55 -76.25 -4.55 -18.12 -76.25 -4.41 -21.79
  [3,16,-76.25,-5.61,-17.55,-76.25,-4.55,-18.12,-76.25,-4.41,-21.79],
// 3 16 -76.25 -5.61 -17.55 -76.25 -4.41 -21.79 -76.25 -5.325 -22.225
  [3,16,-76.25,-5.61,-17.55,-76.25,-4.41,-21.79,-76.25,-5.325,-22.225],
// 3 16 -76.25 -6.44 -16.8 -76.25 -5.61 -17.55 -76.25 -5.325 -22.225
  [3,16,-76.25,-6.44,-16.8,-76.25,-5.61,-17.55,-76.25,-5.325,-22.225],
// 3 16 -76.25 -7.02 -15.9 -76.25 -6.44 -16.8 -76.25 -6.09 -22.825
  [3,16,-76.25,-7.02,-15.9,-76.25,-6.44,-16.8,-76.25,-6.09,-22.825],
// 3 16 -76.25 -7.38 -14.82 -76.25 -7.02 -15.9 -76.25 -6.705 -23.575
  [3,16,-76.25,-7.38,-14.82,-76.25,-7.02,-15.9,-76.25,-6.705,-23.575],
// 3 16 -76.25 -11 -10.5677 -76.25 -7.5 -13.6 -76.25 -7.38 -14.82
  [3,16,-76.25,-11,-10.5677,-76.25,-7.5,-13.6,-76.25,-7.38,-14.82],
// 3 16 -76.25 -7.38 -12.35 -76.25 -7.5 -13.6 -76.25 -11 -10.5677
  [3,16,-76.25,-7.38,-12.35,-76.25,-7.5,-13.6,-76.25,-11,-10.5677],
// 3 16 -76.25 -11 -10.5677 -75.0641 -7.5263 -4.8917 -76.25 -6.8814 -11.0354
  [3,16,-76.25,-11,-10.5677,-75.0641,-7.5263,-4.8917,-76.25,-6.8814,-11.0354],
// 3 16 -76.25 -7.04 -11.28 -76.25 -7.38 -12.35 -76.25 -11 -10.5677
  [3,16,-76.25,-7.04,-11.28,-76.25,-7.38,-12.35,-76.25,-11,-10.5677],
// 3 16 -76.25 -6.8814 -11.0354 -76.25 -7.04 -11.28 -76.25 -11 -10.5677
  [3,16,-76.25,-6.8814,-11.0354,-76.25,-7.04,-11.28,-76.25,-11,-10.5677],
// 3 16 -76.1156 -6.453 -10.3962 -76.25 -6.8814 -11.0354 -75.0641 -7.5263 -4.8917
  [3,16,-76.1156,-6.453,-10.3962,-76.25,-6.8814,-11.0354,-75.0641,-7.5263,-4.8917],
// 3 16 -75.0641 -7.5263 -4.8917 -75.959 -5.6365 -9.6869 -76.1156 -6.453 -10.3962
  [3,16,-75.0641,-7.5263,-4.8917,-75.959,-5.6365,-9.6869,-76.1156,-6.453,-10.3962],
// 3 16 -75.0641 -7.5263 -4.8917 -75.8293 -4.5893 -9.1422 -75.959 -5.6365 -9.6869
  [3,16,-75.0641,-7.5263,-4.8917,-75.8293,-4.5893,-9.1422,-75.959,-5.6365,-9.6869],
// 3 16 -75.0641 -7.5263 -4.8917 -75.7265 -3.3016 -8.7623 -75.8293 -4.5893 -9.1422
  [3,16,-75.0641,-7.5263,-4.8917,-75.7265,-3.3016,-8.7623,-75.8293,-4.5893,-9.1422],
// 4 16 -75.598 -.0145 -8.4774 -75.7265 -3.3016 -8.7623 -75.0641 -7.5263 -4.8917 -74.8675 1.6793 -4.9301
  [4,16,-75.598,-.0145,-8.4774,-75.7265,-3.3016,-8.7623,-75.0641,-7.5263,-4.8917,-74.8675,1.6793,-4.9301],
// 3 16 -75.598 -.0145 -8.4774 -74.8675 1.6793 -4.9301 -75.206 1.6868 -6.6639
  [3,16,-75.598,-.0145,-8.4774,-74.8675,1.6793,-4.9301,-75.206,1.6868,-6.6639],
// 3 16 -75.598 -.0145 -8.4774 -75.206 1.6868 -6.6639 -75.5871 2.2553 -8.6795
  [3,16,-75.598,-.0145,-8.4774,-75.206,1.6868,-6.6639,-75.5871,2.2553,-8.6795],
// 4 16 -75.5858 3.2853 -8.7897 -75.5871 2.2553 -8.6795 -75.206 1.6868 -6.6639 -75.1537 4.1357 -6.6742
  [4,16,-75.5858,3.2853,-8.7897,-75.5871,2.2553,-8.6795,-75.206,1.6868,-6.6639,-75.1537,4.1357,-6.6742],
// 4 16 -75.6335 4.5763 -9.1804 -75.5858 3.2853 -8.7897 -75.1537 4.1357 -6.6742 -74.7438 7.4666 -4.9542
  [4,16,-75.6335,4.5763,-9.1804,-75.5858,3.2853,-8.7897,-75.1537,4.1357,-6.6742,-74.7438,7.4666,-4.9542],
// 3 16 -75.1537 4.1357 -6.6742 -74.8151 4.1282 -4.9403 -74.7438 7.4666 -4.9542
  [3,16,-75.1537,4.1357,-6.6742,-74.8151,4.1282,-4.9403,-74.7438,7.4666,-4.9542],
// 3 16 -75.6335 4.5763 -9.1804 -74.7438 7.4666 -4.9542 -75.7183 5.6282 -9.7339
  [3,16,-75.6335,4.5763,-9.1804,-74.7438,7.4666,-4.9542,-75.7183,5.6282,-9.7339],
// 3 16 -75.7183 5.6282 -9.7339 -74.7438 7.4666 -4.9542 -75.8401 6.4409 -10.4501
  [3,16,-75.7183,5.6282,-9.7339,-74.7438,7.4666,-4.9542,-75.8401,6.4409,-10.4501],
// 3 16 -75.8401 6.4409 -10.4501 -74.7438 7.4666 -4.9542 -75.9987 7.0344 -11.3291
  [3,16,-75.8401,6.4409,-10.4501,-74.7438,7.4666,-4.9542,-75.9987,7.0344,-11.3291],
// 4 16 -76.25 -4.76 -14.6 -76.25 -5.06 -13.6 -76.25 -4.76 -12.57 -76.25 -3.84 -11.881
  [4,16,-76.25,-4.76,-14.6,-76.25,-5.06,-13.6,-76.25,-4.76,-12.57,-76.25,-3.84,-11.881],
// 4 16 -76.25 -3.84 -15.3 -76.25 -4.76 -14.6 -76.25 -3.84 -11.881 -76.25 -2.2876 -11.557
  [4,16,-76.25,-3.84,-15.3,-76.25,-4.76,-14.6,-76.25,-3.84,-11.881,-76.25,-2.2876,-11.557],
// 3 16 -76.25 -2.28 -15.71 -76.25 -3.84 -15.3 -76.25 -2.2876 -11.557
  [3,16,-76.25,-2.28,-15.71,-76.25,-3.84,-15.3,-76.25,-2.2876,-11.557],
// 3 16 -76.25 -2.2876 -11.557 -76.166 -.0019 -11.3864 -76.1392 2.3075 -11.5116
  [3,16,-76.25,-2.2876,-11.557,-76.166,-.0019,-11.3864,-76.1392,2.3075,-11.5116],
// 3 16 -76.25 0 -15.83 -76.25 -2.28 -15.71 -76.25 -2.2876 -11.557
  [3,16,-76.25,0,-15.83,-76.25,-2.28,-15.71,-76.25,-2.2876,-11.557],
// 3 16 -76.25 -2.2876 -11.557 -76.1392 2.3075 -11.5116 -76.179 3.8884 -11.8949
  [3,16,-76.25,-2.2876,-11.557,-76.1392,2.3075,-11.5116,-76.179,3.8884,-11.8949],
// 3 16 -76.25 2.3 -15.71 -76.25 0 -15.83 -76.25 -2.2876 -11.557
  [3,16,-76.25,2.3,-15.71,-76.25,0,-15.83,-76.25,-2.2876,-11.557],
// 3 16 -76.25 -2.2876 -11.557 -76.179 3.8884 -11.8949 -76.25 4.469 -12.3242
  [3,16,-76.25,-2.2876,-11.557,-76.179,3.8884,-11.8949,-76.25,4.469,-12.3242],
// 4 16 -76.25 4.79 -12.57 -76.25 3.87 -15.3 -76.25 2.3 -15.71 -76.25 4.469 -12.3242
  [4,16,-76.25,4.79,-12.57,-76.25,3.87,-15.3,-76.25,2.3,-15.71,-76.25,4.469,-12.3242],
// 3 16 -76.25 4.469 -12.3242 -76.25 2.3 -15.71 -76.25 -2.2876 -11.557
  [3,16,-76.25,4.469,-12.3242,-76.25,2.3,-15.71,-76.25,-2.2876,-11.557],
// 4 16 -76.25 4.79 -14.6 -76.25 3.87 -15.3 -76.25 4.79 -12.57 -76.25 5.09 -13.6
  [4,16,-76.25,4.79,-14.6,-76.25,3.87,-15.3,-76.25,4.79,-12.57,-76.25,5.09,-13.6],
// 3 16 -74.4483 -4.86 -2.042 -73.5233 1.7095 1.9474 -74.3076 1.7269 -2.0694
  [3,16,-74.4483,-4.86,-2.042,-73.5233,1.7095,1.9474,-74.3076,1.7269,-2.0694],
// 4 16 -76.25 -7.5 -35.3 -76.25 -11 -10.5677 -76.25 -7.5 -26.74 -76.25 -7.185 -28.825
  [4,16,-76.25,-7.5,-35.3,-76.25,-11,-10.5677,-76.25,-7.5,-26.74,-76.25,-7.185,-28.825],
// 3 16 -76.25 -11 -10.5677 -76.25 -7.155 -24.49 -76.25 -7.5 -26.74
  [3,16,-76.25,-11,-10.5677,-76.25,-7.155,-24.49,-76.25,-7.5,-26.74],
// 3 16 -76.25 -7.155 -24.49 -76.25 -11 -10.5677 -76.25 -7.38 -14.82
  [3,16,-76.25,-7.155,-24.49,-76.25,-11,-10.5677,-76.25,-7.38,-14.82],
// 3 16 -76.25 -7.38 -14.82 -76.25 -6.705 -23.575 -76.25 -7.155 -24.49
  [3,16,-76.25,-7.38,-14.82,-76.25,-6.705,-23.575,-76.25,-7.155,-24.49],
// 3 16 -76.25 -7.02 -15.9 -76.25 -6.09 -22.825 -76.25 -6.705 -23.575
  [3,16,-76.25,-7.02,-15.9,-76.25,-6.09,-22.825,-76.25,-6.705,-23.575],
// 3 16 -76.25 -6.44 -16.8 -76.25 -5.325 -22.225 -76.25 -6.09 -22.825
  [3,16,-76.25,-6.44,-16.8,-76.25,-5.325,-22.225,-76.25,-6.09,-22.825],
// 4 16 -76.25 -4.41 -21.79 -76.25 -4.55 -18.12 -76.25 -3.26 -18.54 -76.25 -2.145 -21.445
  [4,16,-76.25,-4.41,-21.79,-76.25,-4.55,-18.12,-76.25,-3.26,-18.54,-76.25,-2.145,-21.445],
// 3 16 -76.25 -3.26 -18.54 -76.25 -2.22 -18.65 -76.25 -2.145 -21.445
  [3,16,-76.25,-3.26,-18.54,-76.25,-2.22,-18.65,-76.25,-2.145,-21.445],
// 4 16 -76.25 -2.145 -21.445 -76.25 -2.22 -18.65 -76.25 .03 -18.85 -76.25 4.095 -22.06
  [4,16,-76.25,-2.145,-21.445,-76.25,-2.22,-18.65,-76.25,.03,-18.85,-76.25,4.095,-22.06],
// 4 16 -76.25 -2.145 -21.445 -76.25 4.095 -22.06 -76.25 2.7 -23.215 -76.25 -2.145 -24.19
  [4,16,-76.25,-2.145,-21.445,-76.25,4.095,-22.06,-76.25,2.7,-23.215,-76.25,-2.145,-24.19],
// 3 16 -76.25 -2.145 -24.19 -76.25 2.7 -23.215 -76.25 1.275 -25
  [3,16,-76.25,-2.145,-24.19,-76.25,2.7,-23.215,-76.25,1.275,-25],
// 4 16 -76.25 -2.145 -24.19 -76.25 1.275 -25 -76.25 .675 -25.975 -76.25 -3.405 -24.355
  [4,16,-76.25,-2.145,-24.19,-76.25,1.275,-25,-76.25,.675,-25.975,-76.25,-3.405,-24.355],
// 4 16 -76.25 -3.405 -24.355 -76.25 .675 -25.975 -76.25 -1.11 -28.075 -76.25 -4.275 -24.82
  [4,16,-76.25,-3.405,-24.355,-76.25,.675,-25.975,-76.25,-1.11,-28.075,-76.25,-4.275,-24.82],
// 4 16 -76.25 -4.275 -24.82 -76.25 -1.11 -28.075 -76.25 -1.965 -28.6 -76.25 -4.815 -25.555
  [4,16,-76.25,-4.275,-24.82,-76.25,-1.11,-28.075,-76.25,-1.965,-28.6,-76.25,-4.815,-25.555],
// 4 16 -76.25 -4.815 -25.555 -76.25 -1.965 -28.6 -76.25 -2.82 -28.78 -76.25 -4.995 -26.545
  [4,16,-76.25,-4.815,-25.555,-76.25,-1.965,-28.6,-76.25,-2.82,-28.78,-76.25,-4.995,-26.545],
// 4 16 -76.25 -4.995 -26.545 -76.25 -2.82 -28.78 -76.25 -3.705 -28.63 -76.25 -4.845 -27.475
  [4,16,-76.25,-4.995,-26.545,-76.25,-2.82,-28.78,-76.25,-3.705,-28.63,-76.25,-4.845,-27.475],
// 3 16 -76.25 -4.845 -27.475 -76.25 -3.705 -28.63 -76.25 -4.41 -28.18
  [3,16,-76.25,-4.845,-27.475,-76.25,-3.705,-28.63,-76.25,-4.41,-28.18],
// 4 16 -76.25 4.095 -22.06 -76.25 .03 -18.85 -76.25 3.32 -18.54 -76.25 5.64 -21.415
  [4,16,-76.25,4.095,-22.06,-76.25,.03,-18.85,-76.25,3.32,-18.54,-76.25,5.64,-21.415],
// 3 16 -76.25 3.32 -18.54 -76.25 7.5 -21.175 -76.25 5.64 -21.415
  [3,16,-76.25,3.32,-18.54,-76.25,7.5,-21.175,-76.25,5.64,-21.415],
// 3 16 -76.25 7.5 -31.66 -76.25 7.5 -21.175 -76.25 11 -13.0658
  [3,16,-76.25,7.5,-31.66,-76.25,7.5,-21.175,-76.25,11,-13.0658],
// 3 16 -76.25 7.2 -36.91 -76.25 7.5 -31.66 -76.25 11 -13.0658
  [3,16,-76.25,7.2,-36.91,-76.25,7.5,-31.66,-76.25,11,-13.0658],
// 3 16 -76.25 6.32 -35.3 -76.25 7.5 -31.66 -76.25 7.2 -36.91
  [3,16,-76.25,6.32,-35.3,-76.25,7.5,-31.66,-76.25,7.2,-36.91],
// 4 16 -76.25 7.5 -31.66 -76.25 6.32 -35.3 -76.25 4.91 -34.25 -76.25 4.95 -31.66
  [4,16,-76.25,7.5,-31.66,-76.25,6.32,-35.3,-76.25,4.91,-34.25,-76.25,4.95,-31.66],
// 4 16 -76.25 4.95 -31.66 -76.25 4.91 -34.25 -76.25 3.05 -33.83 -76.25 .9 -30.055
  [4,16,-76.25,4.95,-31.66,-76.25,4.91,-34.25,-76.25,3.05,-33.83,-76.25,.9,-30.055],
// 3 16 -76.25 .9 -30.055 -76.25 2.205 -28.315 -76.25 4.95 -31.66
  [3,16,-76.25,.9,-30.055,-76.25,2.205,-28.315,-76.25,4.95,-31.66],
// 4 16 -76.25 4.95 -31.66 -76.25 2.205 -28.315 -76.25 3.015 -27.115 -76.25 4.14 -25.555
  [4,16,-76.25,4.95,-31.66,-76.25,2.205,-28.315,-76.25,3.015,-27.115,-76.25,4.14,-25.555],
// 3 16 -76.25 4.14 -25.555 -76.25 4.95 -24.865 -76.25 4.95 -31.66
  [3,16,-76.25,4.14,-25.555,-76.25,4.95,-24.865,-76.25,4.95,-31.66],
// 4 16 -76.25 .9 -30.055 -76.25 3.05 -33.83 -76.25 .54 -34.33 -76.25 -.27 -31.105
  [4,16,-76.25,.9,-30.055,-76.25,3.05,-33.83,-76.25,.54,-34.33,-76.25,-.27,-31.105],
// 3 16 -76.25 -1.47 -31.645 -76.25 -.27 -31.105 -76.25 .54 -34.33
  [3,16,-76.25,-1.47,-31.645,-76.25,-.27,-31.105,-76.25,.54,-34.33],
// 4 16 -76.25 -2.88 -31.825 -76.25 -1.47 -31.645 -76.25 .54 -34.33 -76.25 -7.5 -35.3
  [4,16,-76.25,-2.88,-31.825,-76.25,-1.47,-31.645,-76.25,.54,-34.33,-76.25,-7.5,-35.3],
// 3 16 -76.25 -7.5 -35.3 -76.25 -4.755 -31.48 -76.25 -2.88 -31.825
  [3,16,-76.25,-7.5,-35.3,-76.25,-4.755,-31.48,-76.25,-2.88,-31.825],
// 3 16 -76.25 -7.5 -35.3 -76.25 -6.225 -30.445 -76.25 -4.755 -31.48
  [3,16,-76.25,-7.5,-35.3,-76.25,-6.225,-30.445,-76.25,-4.755,-31.48],
// 3 16 -76.25 -7.5 -35.3 -76.25 -7.185 -28.825 -76.25 -6.225 -30.445
  [3,16,-76.25,-7.5,-35.3,-76.25,-7.185,-28.825,-76.25,-6.225,-30.445],
// 
// 4 16 -72.2754 -11.0706 8.2593 -76 -11 -10.5677 -76 11 -13.0658 -71.8499 10.9079 8.1893
  [4,16,-72.2754,-11.0706,8.2593,-76,-11,-10.5677,-76,11,-13.0658,-71.8499,10.9079,8.1893],
// 4 16 -76 -11 -10.5677 -76 -11 -49 -76 11 -49 -76 11 -13.0658
  [4,16,-76,-11,-10.5677,-76,-11,-49,-76,11,-49,-76,11,-13.0658],
// 4 16 -72.0999 10.9079 8.1893 -72.5254 -11.0706 8.2593 -72.2754 -11.0706 8.2593 -71.8499 10.9079 8.1893
  [4,16,-72.0999,10.9079,8.1893,-72.5254,-11.0706,8.2593,-72.2754,-11.0706,8.2593,-71.8499,10.9079,8.1893],
// 4 16 -76.25 -11 -49 -76.25 11 -49 -76 11 -49 -76 -11 -49
  [4,16,-76.25,-11,-49,-76.25,11,-49,-76,11,-49,-76,-11,-49],
// 4 16 -76 -11 -10.5677 -72.2754 -11.0706 8.2593 -72.5254 -11.0706 8.2593 -76.25 -11 -10.5677
  [4,16,-76,-11,-10.5677,-72.2754,-11.0706,8.2593,-72.5254,-11.0706,8.2593,-76.25,-11,-10.5677],
// 4 16 -76 -11 -10.5677 -76.25 -11 -10.5677 -76.25 -11 -49 -76 -11 -49
  [4,16,-76,-11,-10.5677,-76.25,-11,-10.5677,-76.25,-11,-49,-76,-11,-49],
// 4 16 -76 11 -13.0658 -76 11 -49 -76.25 11 -49 -76.25 11 -13.0658
  [4,16,-76,11,-13.0658,-76,11,-49,-76.25,11,-49,-76.25,11,-13.0658],
// 4 16 -71.8499 10.9079 8.1893 -76 11 -13.0658 -76.25 11 -13.0658 -72.0999 10.9079 8.1893
  [4,16,-71.8499,10.9079,8.1893,-76,11,-13.0658,-76.25,11,-13.0658,-72.0999,10.9079,8.1893],
// 5 24 -76.25 11 -13.0658 -76.25 -11 -10.5677 -76.25 -11 -49 -72.5085 -11.0845 8.256
  [5,24,-76.25,11,-13.0658,-76.25,-11,-10.5677,-76.25,-11,-49,-72.5085,-11.0845,8.256],
// 5 24 -76 11 -13.0658 -76 -11 -10.5677 -76 11 -49 -71.8499 10.9079 8.1893
  [5,24,-76,11,-13.0658,-76,-11,-10.5677,-76,11,-49,-71.8499,10.9079,8.1893],
];
makepoly(ldraw_lib__194305fc02(), line=0.2);
